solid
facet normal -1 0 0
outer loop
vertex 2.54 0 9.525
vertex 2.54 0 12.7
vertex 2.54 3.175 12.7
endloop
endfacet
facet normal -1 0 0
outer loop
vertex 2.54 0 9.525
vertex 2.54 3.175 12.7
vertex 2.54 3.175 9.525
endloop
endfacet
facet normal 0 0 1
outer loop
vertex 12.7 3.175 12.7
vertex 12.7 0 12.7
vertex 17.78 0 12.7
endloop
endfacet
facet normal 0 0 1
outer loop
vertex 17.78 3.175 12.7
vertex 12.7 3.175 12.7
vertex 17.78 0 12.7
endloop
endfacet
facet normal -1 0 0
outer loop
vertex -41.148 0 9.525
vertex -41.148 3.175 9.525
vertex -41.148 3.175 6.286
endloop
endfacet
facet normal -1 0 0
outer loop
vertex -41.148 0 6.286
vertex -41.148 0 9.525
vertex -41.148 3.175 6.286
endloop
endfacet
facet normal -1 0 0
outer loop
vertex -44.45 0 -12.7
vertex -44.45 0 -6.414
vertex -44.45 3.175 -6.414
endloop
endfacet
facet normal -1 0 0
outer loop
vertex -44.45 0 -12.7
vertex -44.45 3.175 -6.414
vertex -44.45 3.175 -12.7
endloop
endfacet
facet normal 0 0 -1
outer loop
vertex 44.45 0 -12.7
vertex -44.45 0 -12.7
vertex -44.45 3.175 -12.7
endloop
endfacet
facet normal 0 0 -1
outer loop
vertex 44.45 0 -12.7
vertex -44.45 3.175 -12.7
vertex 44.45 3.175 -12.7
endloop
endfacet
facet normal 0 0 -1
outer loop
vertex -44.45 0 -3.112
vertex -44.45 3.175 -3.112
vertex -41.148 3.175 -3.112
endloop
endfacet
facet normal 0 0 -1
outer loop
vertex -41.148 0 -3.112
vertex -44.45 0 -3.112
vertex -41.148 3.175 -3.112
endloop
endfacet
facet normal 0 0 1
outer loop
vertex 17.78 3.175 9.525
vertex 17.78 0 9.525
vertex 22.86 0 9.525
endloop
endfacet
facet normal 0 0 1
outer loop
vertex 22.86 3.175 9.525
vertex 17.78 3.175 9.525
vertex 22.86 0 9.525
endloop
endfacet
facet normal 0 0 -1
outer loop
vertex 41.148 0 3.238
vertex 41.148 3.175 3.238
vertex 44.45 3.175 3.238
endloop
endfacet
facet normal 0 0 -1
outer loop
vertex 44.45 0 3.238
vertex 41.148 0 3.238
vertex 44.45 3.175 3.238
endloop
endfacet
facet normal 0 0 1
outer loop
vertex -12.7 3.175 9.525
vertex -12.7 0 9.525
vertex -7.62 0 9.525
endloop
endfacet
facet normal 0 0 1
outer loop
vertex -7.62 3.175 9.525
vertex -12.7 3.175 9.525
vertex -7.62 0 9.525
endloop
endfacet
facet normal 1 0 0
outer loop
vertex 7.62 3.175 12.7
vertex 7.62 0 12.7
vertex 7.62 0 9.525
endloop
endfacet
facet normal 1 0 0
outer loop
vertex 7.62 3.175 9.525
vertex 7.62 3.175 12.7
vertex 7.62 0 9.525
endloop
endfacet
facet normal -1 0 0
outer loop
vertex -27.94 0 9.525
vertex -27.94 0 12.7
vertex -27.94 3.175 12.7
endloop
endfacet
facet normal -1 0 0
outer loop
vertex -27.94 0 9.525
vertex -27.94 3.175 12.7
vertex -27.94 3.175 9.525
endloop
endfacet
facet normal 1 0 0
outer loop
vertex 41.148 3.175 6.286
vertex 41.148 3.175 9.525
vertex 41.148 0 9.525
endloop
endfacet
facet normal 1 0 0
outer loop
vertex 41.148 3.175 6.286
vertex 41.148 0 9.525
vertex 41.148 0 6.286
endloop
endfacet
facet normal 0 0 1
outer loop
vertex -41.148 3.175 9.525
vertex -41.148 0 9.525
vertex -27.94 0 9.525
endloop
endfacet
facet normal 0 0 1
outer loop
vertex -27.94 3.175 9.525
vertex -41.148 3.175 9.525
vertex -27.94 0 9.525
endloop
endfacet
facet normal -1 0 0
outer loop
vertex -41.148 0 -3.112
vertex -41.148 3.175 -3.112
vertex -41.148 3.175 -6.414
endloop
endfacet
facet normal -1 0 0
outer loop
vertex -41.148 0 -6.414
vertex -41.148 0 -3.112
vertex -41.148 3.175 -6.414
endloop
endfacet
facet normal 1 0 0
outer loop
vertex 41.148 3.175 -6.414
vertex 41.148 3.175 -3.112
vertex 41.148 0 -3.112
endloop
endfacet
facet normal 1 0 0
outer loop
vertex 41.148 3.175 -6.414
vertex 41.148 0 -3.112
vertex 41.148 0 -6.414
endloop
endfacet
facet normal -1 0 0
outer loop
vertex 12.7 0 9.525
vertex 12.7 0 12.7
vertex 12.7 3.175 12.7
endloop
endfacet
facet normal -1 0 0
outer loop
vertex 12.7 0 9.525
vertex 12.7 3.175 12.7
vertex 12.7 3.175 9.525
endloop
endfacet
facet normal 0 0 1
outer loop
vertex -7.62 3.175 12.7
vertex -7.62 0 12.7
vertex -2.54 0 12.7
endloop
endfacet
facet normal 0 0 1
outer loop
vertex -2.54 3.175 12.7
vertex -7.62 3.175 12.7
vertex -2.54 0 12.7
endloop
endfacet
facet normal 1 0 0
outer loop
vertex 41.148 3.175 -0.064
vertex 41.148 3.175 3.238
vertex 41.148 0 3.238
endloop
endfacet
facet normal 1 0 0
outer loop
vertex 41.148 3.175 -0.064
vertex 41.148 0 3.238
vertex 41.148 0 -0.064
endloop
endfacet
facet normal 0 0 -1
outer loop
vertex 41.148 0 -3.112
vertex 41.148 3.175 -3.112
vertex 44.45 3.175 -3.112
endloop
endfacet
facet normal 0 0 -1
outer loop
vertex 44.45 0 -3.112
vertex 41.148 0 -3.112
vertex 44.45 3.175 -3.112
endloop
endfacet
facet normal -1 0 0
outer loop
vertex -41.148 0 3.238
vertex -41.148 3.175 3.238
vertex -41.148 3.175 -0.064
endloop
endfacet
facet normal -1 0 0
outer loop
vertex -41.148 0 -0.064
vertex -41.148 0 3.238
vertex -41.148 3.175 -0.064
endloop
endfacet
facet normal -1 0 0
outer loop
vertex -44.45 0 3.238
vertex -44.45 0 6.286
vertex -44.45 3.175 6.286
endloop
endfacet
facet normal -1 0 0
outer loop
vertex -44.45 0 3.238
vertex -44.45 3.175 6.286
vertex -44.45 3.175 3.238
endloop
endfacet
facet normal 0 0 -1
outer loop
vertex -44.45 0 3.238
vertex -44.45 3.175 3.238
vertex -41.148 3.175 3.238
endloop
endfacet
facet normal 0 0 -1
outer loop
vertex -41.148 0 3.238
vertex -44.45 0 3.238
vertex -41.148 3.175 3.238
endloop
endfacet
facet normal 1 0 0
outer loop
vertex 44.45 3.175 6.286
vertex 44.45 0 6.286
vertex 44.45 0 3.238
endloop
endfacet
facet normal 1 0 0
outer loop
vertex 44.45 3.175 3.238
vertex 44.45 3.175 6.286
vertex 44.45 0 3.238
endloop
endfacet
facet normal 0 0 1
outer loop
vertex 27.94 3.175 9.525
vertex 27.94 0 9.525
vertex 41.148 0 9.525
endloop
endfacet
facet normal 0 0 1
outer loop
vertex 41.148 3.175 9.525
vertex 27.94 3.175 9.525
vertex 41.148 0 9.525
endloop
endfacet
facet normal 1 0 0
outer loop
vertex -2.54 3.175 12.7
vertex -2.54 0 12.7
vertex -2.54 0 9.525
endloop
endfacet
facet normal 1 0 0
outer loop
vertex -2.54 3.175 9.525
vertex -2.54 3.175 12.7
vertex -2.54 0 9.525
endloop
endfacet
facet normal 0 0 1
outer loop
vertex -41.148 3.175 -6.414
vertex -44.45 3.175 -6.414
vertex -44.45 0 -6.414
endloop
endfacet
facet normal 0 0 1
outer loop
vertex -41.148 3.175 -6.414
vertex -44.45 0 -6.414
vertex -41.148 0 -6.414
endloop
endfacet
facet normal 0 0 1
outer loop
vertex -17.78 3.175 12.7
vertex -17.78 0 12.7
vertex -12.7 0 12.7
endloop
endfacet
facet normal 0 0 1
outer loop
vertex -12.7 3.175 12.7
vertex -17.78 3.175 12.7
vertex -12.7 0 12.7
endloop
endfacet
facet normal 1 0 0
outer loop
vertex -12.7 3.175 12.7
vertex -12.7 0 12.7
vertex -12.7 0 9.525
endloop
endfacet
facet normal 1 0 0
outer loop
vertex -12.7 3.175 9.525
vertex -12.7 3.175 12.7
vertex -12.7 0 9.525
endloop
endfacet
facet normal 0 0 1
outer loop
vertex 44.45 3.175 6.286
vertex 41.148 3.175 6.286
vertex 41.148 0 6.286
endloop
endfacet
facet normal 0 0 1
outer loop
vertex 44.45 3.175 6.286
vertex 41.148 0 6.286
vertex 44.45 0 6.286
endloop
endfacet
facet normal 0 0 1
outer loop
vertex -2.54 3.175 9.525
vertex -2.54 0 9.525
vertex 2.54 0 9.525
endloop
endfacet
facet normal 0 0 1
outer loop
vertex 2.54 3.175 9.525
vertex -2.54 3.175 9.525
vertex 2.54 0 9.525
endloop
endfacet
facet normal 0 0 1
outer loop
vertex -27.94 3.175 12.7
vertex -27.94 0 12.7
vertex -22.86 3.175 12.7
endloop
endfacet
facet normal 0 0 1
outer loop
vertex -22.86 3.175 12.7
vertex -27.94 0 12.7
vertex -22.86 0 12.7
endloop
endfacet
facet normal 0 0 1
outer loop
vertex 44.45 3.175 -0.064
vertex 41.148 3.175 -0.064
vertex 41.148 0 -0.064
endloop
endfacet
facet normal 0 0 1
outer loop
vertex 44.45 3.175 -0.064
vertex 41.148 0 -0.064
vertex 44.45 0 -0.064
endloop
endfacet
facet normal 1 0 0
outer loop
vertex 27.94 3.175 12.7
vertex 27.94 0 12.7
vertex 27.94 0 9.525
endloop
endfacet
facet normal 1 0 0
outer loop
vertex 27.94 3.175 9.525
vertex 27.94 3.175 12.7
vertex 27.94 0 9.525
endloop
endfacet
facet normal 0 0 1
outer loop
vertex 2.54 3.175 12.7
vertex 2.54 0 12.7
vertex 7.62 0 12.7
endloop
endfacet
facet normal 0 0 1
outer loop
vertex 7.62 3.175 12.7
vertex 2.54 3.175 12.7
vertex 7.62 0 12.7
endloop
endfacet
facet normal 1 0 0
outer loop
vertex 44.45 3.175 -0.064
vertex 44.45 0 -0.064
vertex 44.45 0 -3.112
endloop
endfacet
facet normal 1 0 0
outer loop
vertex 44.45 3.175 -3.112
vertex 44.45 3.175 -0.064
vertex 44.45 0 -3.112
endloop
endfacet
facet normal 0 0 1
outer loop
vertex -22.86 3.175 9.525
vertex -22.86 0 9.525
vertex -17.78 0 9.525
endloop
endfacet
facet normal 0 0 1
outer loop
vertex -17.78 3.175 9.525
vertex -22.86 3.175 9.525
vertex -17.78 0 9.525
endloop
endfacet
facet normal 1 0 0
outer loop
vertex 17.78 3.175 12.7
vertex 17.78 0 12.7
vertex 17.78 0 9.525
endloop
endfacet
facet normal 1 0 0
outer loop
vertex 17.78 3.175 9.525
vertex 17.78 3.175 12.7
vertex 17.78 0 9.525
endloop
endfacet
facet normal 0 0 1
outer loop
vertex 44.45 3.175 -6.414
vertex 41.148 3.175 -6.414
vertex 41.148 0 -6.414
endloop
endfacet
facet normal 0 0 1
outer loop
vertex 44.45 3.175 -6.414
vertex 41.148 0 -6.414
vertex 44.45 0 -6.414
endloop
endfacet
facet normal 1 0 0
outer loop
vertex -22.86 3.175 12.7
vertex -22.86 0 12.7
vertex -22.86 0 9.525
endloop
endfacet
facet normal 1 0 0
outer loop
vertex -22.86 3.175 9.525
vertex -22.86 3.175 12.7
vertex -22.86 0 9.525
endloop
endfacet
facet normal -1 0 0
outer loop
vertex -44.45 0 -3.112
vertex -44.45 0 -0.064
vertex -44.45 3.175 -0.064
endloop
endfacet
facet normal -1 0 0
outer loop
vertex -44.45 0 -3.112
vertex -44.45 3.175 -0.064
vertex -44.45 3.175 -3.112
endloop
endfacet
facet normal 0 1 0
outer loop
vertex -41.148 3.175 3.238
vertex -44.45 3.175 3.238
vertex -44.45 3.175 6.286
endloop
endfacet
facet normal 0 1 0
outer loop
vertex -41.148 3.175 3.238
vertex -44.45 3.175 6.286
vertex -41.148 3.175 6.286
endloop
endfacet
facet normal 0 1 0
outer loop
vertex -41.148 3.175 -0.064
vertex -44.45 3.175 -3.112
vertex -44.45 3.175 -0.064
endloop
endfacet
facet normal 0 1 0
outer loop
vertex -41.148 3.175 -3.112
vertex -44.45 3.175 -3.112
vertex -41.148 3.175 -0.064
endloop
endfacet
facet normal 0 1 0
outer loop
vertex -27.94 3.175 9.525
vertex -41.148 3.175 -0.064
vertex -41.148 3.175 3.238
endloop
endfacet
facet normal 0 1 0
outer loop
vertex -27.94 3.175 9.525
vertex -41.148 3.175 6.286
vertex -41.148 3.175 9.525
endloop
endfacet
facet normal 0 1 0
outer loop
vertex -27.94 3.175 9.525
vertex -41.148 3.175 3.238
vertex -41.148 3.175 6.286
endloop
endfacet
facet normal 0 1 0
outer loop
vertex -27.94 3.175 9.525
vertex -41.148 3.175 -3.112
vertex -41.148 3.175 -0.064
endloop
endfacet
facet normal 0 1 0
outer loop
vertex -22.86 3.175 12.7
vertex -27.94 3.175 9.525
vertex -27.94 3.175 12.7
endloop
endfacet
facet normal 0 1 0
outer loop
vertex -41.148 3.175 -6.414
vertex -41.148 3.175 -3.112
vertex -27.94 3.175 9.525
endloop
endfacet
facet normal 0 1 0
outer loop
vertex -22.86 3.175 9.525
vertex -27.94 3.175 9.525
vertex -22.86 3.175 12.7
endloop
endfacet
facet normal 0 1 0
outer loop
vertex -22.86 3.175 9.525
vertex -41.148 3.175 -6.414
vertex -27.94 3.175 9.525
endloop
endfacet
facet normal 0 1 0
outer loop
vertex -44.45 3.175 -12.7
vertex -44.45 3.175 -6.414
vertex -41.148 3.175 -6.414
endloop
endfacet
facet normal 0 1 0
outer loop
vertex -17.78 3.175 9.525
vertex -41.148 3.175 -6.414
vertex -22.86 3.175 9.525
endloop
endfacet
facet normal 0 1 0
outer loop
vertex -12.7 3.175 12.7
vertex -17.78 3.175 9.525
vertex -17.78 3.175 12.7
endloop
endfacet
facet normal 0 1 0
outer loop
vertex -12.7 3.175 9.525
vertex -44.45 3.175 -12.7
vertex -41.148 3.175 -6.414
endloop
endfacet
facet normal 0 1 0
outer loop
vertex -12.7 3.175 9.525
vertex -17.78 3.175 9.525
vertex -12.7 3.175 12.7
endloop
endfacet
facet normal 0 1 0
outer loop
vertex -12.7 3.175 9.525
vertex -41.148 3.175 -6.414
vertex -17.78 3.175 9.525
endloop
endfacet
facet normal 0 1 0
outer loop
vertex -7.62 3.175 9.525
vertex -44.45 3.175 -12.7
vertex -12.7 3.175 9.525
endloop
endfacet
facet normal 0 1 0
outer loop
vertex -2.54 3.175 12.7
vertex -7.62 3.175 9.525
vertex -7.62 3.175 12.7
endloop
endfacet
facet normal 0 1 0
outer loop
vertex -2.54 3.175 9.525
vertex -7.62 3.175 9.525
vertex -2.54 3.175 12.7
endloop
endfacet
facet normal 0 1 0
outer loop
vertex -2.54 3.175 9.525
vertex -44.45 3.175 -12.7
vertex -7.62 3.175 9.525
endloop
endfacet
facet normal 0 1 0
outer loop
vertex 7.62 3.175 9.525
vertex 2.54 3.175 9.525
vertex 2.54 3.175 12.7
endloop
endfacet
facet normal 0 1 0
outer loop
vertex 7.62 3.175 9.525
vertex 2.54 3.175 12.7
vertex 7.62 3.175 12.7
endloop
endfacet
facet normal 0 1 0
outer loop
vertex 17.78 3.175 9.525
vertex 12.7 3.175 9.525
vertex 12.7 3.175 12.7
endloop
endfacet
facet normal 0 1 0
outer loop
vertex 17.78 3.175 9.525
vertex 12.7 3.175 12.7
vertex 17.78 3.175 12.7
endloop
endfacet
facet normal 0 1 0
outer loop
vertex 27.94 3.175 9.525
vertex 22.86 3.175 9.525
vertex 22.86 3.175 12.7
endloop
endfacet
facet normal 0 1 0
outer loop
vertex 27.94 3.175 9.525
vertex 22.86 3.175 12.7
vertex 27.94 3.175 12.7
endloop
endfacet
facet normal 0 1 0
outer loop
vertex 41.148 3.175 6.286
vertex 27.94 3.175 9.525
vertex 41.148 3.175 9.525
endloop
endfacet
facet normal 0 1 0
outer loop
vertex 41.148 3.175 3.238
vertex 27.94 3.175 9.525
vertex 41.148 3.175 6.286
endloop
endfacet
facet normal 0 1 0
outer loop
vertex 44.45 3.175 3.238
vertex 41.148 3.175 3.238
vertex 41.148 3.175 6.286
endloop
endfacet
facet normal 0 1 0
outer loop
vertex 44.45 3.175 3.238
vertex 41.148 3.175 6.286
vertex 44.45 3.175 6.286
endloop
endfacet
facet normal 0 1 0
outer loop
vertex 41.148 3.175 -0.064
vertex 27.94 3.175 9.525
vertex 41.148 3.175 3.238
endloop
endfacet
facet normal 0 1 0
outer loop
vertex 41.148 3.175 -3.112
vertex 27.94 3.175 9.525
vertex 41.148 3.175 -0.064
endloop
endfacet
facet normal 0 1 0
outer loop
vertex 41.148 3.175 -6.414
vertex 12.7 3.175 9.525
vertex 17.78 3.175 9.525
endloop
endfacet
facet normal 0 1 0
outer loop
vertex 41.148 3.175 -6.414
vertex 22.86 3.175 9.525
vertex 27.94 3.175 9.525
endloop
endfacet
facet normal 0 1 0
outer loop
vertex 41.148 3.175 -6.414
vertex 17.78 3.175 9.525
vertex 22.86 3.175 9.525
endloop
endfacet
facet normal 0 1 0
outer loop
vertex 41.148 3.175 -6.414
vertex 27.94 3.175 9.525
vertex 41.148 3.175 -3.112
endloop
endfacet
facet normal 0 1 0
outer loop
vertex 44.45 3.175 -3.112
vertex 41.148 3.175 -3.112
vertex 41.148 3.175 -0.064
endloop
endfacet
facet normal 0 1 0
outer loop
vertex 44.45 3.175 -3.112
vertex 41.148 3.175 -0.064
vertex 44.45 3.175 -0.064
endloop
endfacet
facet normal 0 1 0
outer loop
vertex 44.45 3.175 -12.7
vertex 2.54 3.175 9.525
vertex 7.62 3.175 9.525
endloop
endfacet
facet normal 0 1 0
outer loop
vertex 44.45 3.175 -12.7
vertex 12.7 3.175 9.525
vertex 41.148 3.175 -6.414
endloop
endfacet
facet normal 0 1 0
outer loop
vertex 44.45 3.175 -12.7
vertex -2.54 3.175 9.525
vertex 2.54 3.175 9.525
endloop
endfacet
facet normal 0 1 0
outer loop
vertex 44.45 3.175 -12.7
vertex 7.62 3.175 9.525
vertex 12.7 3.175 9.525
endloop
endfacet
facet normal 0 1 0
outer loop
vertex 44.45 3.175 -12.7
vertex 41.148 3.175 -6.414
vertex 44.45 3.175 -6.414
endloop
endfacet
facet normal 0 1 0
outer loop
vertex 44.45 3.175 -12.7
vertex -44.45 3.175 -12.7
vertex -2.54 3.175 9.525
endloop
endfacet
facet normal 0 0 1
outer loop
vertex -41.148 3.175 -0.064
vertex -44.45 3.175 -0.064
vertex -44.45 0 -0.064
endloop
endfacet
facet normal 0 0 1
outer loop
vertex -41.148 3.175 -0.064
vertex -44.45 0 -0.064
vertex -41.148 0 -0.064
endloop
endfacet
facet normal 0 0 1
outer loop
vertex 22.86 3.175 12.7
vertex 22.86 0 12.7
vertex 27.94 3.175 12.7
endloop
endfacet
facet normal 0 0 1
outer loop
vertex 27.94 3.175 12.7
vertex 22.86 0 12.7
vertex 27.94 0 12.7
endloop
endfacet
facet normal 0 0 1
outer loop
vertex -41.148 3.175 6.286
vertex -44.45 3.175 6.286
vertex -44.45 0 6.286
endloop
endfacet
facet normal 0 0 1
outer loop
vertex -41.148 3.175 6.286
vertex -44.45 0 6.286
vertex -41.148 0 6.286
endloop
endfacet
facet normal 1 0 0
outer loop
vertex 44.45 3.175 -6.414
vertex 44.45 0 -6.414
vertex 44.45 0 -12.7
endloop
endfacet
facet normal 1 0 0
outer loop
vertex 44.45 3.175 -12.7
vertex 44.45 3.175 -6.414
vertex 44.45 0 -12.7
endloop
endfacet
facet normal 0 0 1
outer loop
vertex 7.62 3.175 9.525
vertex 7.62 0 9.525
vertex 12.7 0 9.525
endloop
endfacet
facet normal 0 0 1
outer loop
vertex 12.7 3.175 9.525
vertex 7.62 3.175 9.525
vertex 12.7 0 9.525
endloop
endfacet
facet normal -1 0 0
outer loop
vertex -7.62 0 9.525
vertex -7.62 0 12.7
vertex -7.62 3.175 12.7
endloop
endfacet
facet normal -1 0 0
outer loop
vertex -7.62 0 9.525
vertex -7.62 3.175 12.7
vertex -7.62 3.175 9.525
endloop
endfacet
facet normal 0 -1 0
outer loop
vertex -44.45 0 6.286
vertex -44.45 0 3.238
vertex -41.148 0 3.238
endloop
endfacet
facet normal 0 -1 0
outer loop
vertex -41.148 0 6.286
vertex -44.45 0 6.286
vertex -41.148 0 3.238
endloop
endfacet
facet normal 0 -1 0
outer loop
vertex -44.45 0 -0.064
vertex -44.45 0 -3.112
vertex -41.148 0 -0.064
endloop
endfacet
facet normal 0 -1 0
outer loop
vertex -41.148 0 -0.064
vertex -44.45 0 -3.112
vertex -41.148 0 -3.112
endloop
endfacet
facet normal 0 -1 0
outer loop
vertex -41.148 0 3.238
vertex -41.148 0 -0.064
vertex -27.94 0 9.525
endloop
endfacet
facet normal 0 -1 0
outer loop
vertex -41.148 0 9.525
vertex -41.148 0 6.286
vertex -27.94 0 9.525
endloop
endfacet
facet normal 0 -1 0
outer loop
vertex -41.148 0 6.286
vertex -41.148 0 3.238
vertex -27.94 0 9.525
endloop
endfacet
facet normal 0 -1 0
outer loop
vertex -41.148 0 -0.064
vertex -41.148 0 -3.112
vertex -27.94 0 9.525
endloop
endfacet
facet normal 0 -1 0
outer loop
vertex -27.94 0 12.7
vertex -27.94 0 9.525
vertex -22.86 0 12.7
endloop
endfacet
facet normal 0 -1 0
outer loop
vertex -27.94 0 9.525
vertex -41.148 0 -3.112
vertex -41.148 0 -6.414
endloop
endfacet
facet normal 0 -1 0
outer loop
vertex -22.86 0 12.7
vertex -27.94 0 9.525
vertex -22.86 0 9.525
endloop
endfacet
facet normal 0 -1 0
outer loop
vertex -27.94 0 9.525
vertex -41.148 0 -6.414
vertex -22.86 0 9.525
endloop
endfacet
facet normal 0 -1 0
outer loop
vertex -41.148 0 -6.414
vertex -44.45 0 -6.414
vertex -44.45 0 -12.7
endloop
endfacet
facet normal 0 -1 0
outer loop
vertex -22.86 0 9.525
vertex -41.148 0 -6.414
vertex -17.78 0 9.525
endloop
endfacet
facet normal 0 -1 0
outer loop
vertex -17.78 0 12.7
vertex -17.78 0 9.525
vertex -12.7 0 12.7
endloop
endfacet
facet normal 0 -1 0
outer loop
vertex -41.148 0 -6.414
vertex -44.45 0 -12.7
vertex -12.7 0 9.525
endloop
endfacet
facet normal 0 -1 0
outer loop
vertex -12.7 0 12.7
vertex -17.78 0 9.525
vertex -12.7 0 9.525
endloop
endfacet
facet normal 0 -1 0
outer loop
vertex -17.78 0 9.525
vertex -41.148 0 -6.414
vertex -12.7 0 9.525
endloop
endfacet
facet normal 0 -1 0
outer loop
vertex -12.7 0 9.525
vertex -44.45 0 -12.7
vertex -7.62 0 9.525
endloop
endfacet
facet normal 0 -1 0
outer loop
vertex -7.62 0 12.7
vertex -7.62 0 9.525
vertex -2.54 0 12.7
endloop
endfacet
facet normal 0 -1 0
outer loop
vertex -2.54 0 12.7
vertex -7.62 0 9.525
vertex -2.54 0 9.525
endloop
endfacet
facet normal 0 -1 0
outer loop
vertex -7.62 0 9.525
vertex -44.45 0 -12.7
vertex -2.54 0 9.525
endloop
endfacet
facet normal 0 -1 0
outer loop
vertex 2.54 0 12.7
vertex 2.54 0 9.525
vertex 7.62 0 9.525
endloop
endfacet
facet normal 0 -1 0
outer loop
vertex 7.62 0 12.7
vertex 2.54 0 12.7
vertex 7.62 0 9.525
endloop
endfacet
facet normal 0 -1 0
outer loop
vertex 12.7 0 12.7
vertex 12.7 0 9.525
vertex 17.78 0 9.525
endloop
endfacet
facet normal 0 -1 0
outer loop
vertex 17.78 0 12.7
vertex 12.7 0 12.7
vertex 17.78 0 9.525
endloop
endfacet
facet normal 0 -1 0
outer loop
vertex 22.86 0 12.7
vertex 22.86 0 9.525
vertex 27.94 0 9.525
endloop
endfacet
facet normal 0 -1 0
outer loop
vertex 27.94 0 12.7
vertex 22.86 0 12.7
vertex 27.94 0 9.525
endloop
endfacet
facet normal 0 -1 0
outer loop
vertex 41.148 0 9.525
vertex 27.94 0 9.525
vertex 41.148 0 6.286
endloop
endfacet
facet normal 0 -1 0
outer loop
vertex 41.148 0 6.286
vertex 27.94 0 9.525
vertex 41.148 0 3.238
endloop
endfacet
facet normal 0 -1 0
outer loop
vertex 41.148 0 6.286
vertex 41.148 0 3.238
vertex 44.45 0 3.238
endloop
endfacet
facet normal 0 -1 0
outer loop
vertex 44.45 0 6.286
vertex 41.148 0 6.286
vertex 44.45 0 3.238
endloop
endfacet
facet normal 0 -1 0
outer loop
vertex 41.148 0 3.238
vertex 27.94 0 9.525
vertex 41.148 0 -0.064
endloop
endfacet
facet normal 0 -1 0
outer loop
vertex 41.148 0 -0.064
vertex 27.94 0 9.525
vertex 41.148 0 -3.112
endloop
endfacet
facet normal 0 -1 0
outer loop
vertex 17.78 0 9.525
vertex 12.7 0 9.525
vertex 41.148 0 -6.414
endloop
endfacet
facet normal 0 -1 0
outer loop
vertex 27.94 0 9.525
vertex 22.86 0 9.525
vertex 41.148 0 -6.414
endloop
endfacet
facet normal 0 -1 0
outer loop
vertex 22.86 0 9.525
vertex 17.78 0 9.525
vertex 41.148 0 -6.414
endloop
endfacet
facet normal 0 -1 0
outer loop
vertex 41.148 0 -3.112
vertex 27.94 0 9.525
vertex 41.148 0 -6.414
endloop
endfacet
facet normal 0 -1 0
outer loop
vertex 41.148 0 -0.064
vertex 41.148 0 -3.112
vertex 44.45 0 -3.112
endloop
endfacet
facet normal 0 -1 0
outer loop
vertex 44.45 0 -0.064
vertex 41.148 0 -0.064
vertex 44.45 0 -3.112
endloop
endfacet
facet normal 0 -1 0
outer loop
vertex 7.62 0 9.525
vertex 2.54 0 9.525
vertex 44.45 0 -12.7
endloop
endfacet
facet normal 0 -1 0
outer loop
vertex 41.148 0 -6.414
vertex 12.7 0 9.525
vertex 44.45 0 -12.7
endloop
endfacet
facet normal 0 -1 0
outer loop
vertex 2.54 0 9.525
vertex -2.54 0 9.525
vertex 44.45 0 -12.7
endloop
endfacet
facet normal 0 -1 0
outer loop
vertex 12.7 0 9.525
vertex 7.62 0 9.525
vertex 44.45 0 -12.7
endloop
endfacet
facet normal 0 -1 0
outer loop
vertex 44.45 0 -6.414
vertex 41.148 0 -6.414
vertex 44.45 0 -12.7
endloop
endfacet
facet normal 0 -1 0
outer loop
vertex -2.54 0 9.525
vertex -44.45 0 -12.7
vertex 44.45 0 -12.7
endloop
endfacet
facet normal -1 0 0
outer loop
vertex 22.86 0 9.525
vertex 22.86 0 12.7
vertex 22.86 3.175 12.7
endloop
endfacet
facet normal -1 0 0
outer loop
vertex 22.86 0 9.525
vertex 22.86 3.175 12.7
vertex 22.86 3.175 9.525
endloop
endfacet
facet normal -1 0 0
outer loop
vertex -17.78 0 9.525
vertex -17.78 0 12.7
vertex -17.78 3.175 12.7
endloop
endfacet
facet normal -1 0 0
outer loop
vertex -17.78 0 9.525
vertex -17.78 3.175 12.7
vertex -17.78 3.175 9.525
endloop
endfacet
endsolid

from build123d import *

# Parameters (mm, degrees)
SKETCH1_W           = 88.9
SKETCH1_H           = 19.05
BOSS_EXTRUDE1_DEPTH = 3.175
SKETCH2_W           = 3.302
SKETCH2_H           = 3.302
CUT_EXTRUDE1_DEPTH  = 46.5698228
SKETCH3_W           = 5.08
SKETCH3_H           = 3.175
SKETCH3_W_2         = 88.9
BOSS_EXTRUDE2_DEPTH = 3.175


with BuildPart() as part:
    # Sketch1 → Boss-Extrude1 (new body)
    with BuildSketch(Plane(origin=(0, 0, 0), x_dir=(1, 0, 0), z_dir=(0, 1, 0))):
        Rectangle(SKETCH1_W, SKETCH1_H)
    extrude(amount=BOSS_EXTRUDE1_DEPTH)

    # Sketch2 → Cut-Extrude1 (cut, through all)
    with BuildSketch(Plane(origin=(0, 3.175, 0), x_dir=(1, 0, 0), z_dir=(0, 1, 0))):
        with Locations((-42.799, 4.7625)):
            Rectangle(SKETCH2_W, SKETCH2_H)
        with Locations((-42.799, -1.5875)):
            Rectangle(SKETCH2_W, SKETCH2_H)
        with Locations((-42.799, -7.9375)):
            Rectangle(SKETCH2_W, SKETCH2_H)
        with Locations((42.799, -7.9375)):
            Rectangle(SKETCH2_W, SKETCH2_H)
        with Locations((42.799, -1.5875)):
            Rectangle(SKETCH2_W, SKETCH2_H)
        with Locations((42.799, 4.7625)):
            Rectangle(SKETCH2_W, SKETCH2_H)
    extrude(amount=-CUT_EXTRUDE1_DEPTH, mode=Mode.SUBTRACT)

    # Sketch3 → Boss-Extrude2 (add)
    with BuildSketch(Plane(origin=(0, 0, 0), x_dir=(1, 0, 0), z_dir=(0, 1, 0))):
        with Locations((-25.4, -11.1125)):
            Rectangle(SKETCH3_W, SKETCH3_H)
        with Locations((-15.24, -11.1125)):
            Rectangle(SKETCH3_W, SKETCH3_H)
        with Locations((0, 11.1125)):
            Rectangle(SKETCH3_W_2, SKETCH3_H)
        with Locations((-5.08, -11.1125)):
            Rectangle(SKETCH3_W, SKETCH3_H)
        with Locations((5.08, -11.1125)):
            Rectangle(SKETCH3_W, SKETCH3_H)
        with Locations((15.24, -11.1125)):
            Rectangle(SKETCH3_W, SKETCH3_H)
        with Locations((25.4, -11.1125)):
            Rectangle(SKETCH3_W, SKETCH3_H)
    extrude(amount=BOSS_EXTRUDE2_DEPTH)


solid = part.part
